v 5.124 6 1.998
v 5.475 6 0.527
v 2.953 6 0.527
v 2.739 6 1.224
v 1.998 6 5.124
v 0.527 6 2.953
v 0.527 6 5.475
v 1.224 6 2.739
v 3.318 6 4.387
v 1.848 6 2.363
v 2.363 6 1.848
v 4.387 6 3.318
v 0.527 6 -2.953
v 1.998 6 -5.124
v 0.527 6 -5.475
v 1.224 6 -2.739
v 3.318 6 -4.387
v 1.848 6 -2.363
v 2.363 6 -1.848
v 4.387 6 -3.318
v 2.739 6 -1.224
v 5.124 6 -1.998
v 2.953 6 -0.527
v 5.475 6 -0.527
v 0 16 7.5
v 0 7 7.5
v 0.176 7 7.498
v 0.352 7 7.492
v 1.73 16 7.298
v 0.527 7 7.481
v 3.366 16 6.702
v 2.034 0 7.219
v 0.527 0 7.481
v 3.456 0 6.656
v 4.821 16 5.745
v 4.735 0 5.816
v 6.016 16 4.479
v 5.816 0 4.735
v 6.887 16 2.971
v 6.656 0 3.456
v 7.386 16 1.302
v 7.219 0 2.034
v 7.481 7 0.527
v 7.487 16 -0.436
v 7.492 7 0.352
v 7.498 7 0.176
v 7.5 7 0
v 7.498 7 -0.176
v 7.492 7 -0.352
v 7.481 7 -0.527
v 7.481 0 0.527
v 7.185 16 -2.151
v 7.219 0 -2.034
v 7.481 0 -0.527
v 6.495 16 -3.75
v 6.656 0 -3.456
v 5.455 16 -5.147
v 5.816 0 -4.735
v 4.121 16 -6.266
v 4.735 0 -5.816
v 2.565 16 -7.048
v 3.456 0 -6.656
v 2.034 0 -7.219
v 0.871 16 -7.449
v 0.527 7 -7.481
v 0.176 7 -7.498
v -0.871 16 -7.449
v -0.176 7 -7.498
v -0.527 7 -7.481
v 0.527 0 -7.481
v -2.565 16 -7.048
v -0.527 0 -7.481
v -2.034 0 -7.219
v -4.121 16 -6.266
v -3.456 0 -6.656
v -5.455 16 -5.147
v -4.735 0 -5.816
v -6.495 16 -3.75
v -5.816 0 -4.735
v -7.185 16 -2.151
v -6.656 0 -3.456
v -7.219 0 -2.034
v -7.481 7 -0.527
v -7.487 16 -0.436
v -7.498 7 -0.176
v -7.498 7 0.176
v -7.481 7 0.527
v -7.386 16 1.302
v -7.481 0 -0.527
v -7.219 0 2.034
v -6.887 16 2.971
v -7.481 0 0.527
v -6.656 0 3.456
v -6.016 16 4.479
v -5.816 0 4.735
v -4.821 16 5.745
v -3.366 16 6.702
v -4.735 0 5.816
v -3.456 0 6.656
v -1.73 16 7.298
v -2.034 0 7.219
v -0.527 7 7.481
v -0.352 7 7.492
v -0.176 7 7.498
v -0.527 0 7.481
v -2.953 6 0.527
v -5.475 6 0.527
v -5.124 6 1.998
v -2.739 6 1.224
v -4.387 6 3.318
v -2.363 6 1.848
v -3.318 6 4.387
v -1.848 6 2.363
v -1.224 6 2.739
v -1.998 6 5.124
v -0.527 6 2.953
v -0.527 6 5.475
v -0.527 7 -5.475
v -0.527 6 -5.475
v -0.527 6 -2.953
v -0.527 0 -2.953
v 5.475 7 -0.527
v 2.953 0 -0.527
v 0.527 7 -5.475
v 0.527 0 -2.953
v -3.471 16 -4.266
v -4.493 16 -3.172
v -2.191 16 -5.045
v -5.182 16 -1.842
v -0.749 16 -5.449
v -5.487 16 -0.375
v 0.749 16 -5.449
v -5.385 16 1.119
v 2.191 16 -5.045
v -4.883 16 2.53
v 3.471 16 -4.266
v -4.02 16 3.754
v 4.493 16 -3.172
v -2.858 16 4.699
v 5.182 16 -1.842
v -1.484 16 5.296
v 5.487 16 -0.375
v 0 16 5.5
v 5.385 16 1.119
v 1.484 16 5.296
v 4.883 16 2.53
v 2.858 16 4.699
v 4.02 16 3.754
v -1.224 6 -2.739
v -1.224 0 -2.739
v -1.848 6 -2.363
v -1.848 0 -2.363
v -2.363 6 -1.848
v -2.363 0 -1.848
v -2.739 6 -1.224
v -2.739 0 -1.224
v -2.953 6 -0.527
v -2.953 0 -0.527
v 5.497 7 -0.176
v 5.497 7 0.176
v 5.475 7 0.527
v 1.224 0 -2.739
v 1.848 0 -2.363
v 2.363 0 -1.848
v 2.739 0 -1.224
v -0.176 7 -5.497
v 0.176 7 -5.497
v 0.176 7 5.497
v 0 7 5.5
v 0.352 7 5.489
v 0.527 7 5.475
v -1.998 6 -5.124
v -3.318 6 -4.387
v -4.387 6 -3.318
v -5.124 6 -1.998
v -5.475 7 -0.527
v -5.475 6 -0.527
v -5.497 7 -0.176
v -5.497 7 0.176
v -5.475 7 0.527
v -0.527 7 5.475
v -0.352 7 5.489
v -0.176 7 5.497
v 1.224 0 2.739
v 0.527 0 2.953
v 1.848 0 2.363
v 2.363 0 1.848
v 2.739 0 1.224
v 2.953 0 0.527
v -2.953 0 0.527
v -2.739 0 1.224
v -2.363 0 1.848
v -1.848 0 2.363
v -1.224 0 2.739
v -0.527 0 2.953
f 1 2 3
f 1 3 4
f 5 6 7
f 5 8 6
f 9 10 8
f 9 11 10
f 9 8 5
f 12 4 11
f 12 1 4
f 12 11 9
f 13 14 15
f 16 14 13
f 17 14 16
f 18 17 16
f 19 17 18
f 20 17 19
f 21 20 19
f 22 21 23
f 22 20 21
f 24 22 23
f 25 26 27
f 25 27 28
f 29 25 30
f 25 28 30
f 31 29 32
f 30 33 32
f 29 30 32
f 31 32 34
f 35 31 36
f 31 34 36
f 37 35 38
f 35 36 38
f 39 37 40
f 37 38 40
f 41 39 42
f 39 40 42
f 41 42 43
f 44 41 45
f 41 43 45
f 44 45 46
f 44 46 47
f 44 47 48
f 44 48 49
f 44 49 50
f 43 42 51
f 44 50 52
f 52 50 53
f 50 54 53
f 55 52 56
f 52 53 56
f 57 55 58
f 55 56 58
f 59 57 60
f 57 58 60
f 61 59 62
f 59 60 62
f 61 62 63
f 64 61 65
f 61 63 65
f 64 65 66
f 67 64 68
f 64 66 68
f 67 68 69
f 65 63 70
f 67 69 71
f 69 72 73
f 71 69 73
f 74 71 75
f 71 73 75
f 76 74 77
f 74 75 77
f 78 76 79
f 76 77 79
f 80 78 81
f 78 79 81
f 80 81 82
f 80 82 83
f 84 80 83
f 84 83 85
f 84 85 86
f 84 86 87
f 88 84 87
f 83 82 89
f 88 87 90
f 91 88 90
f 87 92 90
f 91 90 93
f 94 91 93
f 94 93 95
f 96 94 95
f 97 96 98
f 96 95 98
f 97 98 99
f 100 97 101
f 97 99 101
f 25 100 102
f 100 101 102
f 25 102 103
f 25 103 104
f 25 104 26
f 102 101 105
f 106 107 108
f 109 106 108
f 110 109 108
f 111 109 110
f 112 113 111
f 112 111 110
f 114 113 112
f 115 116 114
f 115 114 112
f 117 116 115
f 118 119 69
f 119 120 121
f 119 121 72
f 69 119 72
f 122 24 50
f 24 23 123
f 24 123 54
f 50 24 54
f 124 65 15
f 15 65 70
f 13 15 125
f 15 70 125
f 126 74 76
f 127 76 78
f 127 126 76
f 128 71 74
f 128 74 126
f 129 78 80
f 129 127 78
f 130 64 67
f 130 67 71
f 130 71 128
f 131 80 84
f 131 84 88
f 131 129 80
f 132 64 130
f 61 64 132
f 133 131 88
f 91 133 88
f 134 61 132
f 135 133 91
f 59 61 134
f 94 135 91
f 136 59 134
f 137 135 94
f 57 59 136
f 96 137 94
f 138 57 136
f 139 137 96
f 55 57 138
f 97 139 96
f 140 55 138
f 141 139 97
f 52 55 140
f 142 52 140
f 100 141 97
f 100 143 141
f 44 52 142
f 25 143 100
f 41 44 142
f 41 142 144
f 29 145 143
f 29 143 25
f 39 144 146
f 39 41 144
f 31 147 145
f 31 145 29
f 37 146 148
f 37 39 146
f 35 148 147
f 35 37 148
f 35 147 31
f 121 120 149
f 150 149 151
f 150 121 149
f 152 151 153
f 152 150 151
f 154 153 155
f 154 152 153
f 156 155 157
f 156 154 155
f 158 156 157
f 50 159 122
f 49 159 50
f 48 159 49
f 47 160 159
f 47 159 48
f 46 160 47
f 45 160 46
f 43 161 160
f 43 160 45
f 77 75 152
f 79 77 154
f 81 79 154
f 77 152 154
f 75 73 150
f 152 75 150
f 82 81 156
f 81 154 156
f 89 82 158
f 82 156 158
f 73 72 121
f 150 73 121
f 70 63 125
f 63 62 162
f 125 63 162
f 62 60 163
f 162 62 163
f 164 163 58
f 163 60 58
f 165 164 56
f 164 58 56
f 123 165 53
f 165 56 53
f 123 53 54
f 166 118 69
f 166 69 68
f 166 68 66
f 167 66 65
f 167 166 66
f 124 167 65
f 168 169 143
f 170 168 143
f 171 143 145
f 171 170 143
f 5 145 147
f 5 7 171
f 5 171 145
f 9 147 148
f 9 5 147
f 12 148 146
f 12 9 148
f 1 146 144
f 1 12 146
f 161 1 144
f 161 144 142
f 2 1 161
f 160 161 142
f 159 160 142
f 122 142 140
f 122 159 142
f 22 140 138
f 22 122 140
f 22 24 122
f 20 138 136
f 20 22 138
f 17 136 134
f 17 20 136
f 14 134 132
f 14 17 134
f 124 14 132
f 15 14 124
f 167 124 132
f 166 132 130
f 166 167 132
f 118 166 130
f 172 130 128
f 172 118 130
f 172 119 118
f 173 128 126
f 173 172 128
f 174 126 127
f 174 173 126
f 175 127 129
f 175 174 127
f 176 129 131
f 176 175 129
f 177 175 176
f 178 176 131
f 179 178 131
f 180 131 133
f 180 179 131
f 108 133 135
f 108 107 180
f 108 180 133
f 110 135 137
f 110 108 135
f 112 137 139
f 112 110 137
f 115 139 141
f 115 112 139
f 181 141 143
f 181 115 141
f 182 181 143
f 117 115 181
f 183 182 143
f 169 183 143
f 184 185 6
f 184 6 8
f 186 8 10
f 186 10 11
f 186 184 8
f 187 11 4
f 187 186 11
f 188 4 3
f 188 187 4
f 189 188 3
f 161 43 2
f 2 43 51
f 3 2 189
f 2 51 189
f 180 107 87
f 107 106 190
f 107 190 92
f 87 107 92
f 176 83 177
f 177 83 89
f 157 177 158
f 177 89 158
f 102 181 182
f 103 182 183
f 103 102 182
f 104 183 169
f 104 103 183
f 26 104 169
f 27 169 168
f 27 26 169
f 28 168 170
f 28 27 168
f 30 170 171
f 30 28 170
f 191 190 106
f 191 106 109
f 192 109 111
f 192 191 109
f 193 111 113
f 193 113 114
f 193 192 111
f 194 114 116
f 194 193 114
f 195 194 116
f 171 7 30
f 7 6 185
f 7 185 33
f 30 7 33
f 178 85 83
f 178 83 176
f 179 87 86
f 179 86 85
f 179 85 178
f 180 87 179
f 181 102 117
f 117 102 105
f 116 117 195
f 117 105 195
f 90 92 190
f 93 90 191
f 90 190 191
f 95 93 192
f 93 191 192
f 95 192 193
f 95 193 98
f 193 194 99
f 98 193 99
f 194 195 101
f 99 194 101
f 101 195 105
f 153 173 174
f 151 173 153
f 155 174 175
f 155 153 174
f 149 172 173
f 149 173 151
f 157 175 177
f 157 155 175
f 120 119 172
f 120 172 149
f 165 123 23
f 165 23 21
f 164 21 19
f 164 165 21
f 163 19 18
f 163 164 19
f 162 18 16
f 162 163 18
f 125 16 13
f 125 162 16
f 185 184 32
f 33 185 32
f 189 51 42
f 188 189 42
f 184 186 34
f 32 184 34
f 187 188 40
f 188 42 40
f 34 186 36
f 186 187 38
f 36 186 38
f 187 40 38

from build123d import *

# Parameters (mm, degrees)
SKETCH1_R           = 7.5
SKETCH1_R_2         = 3
BOSS_EXTRUDE1_DEPTH = 6
SKETCH2_R           = 7.5
SKETCH2_R_2         = 5.5
BOSS_EXTRUDE2_DEPTH = 10
CUT_EXTRUDE1_DEPTH  = 7


with BuildPart() as part:
    # Sketch1 → Boss-Extrude1 (new body)
    with BuildSketch(Plane(origin=(0, 0, 0), x_dir=(1, 0, 0), z_dir=(0, 1, 0))):
        with Locations(Location((0, 0, 0), (0, 0, 270))):
            Circle(SKETCH1_R)
        with Locations(Location((0, 0, 0), (0, 0, 270))):
            Circle(SKETCH1_R_2, mode=Mode.SUBTRACT)
    extrude(amount=BOSS_EXTRUDE1_DEPTH)

    # Sketch2 → Boss-Extrude2 (add)
    with BuildSketch(Plane(origin=(0, 6, 0), x_dir=(1, 0, 0), z_dir=(0, 1, 0))):
        with Locations(Location((0, 0, 0), (0, 0, 270))):
            Circle(SKETCH2_R)
        with Locations(Location((0, 0, 0), (0, 0, 270))):
            Circle(SKETCH2_R_2, mode=Mode.SUBTRACT)
    extrude(amount=BOSS_EXTRUDE2_DEPTH)

    # Sketch3 → Cut-Extrude1 (cut)
    with BuildSketch(Plane.XZ):
        with BuildLine():
            Line((-0.527362107, 10.532593193), (-0.527362107, 7.481436306))
            ThreePointArc((-0.527362107, 7.481436306), (0, 7.5), (0.527362107, 7.481436306))
            Line((0.527362107, 7.481436306), (0.527362107, 10.532593193))
            Line((0.527362107, 10.532593193), (-0.527362107, 10.532593193))
        make_face()
        with BuildLine():
            Line((-7.481436306, 0.527362107), (-10.459348456, 0.527362107))
            Line((-10.459348456, 0.527362107), (-10.459348456, -0.527362107))
            Line((-10.459348456, -0.527362107), (-7.481436306, -0.527362107))
            ThreePointArc((-7.481436306, -0.527362107), (-7.5, 0), (-7.481436306, 0.527362107))
        make_face()
        with BuildLine():
            ThreePointArc((0.527362107, 7.481436306), (0, 7.5), (-0.527362107, 7.481436306))
            Line((-0.527362107, 7.481436306), (-0.527362107, 2.953284478))
            ThreePointArc((-0.527362107, 2.953284478), (0, 3), (0.527362107, 2.953284478))
            Line((0.527362107, 2.953284478), (0.527362107, 7.481436306))
        make_face()
        with BuildLine():
            Line((-0.527362107, -2.953284478), (-0.527362107, -7.481436306))
            ThreePointArc((-0.527362107, -7.481436306), (0, -7.5), (0.527362107, -7.481436306))
            Line((0.527362107, -7.481436306), (0.527362107, -2.953284478))
            ThreePointArc((0.527362107, -2.953284478), (0, -3), (-0.527362107, -2.953284478))
        make_face()
        with BuildLine():
            Line((-2.953284478, 0.527362107), (-7.481436306, 0.527362107))
            ThreePointArc((-7.481436306, 0.527362107), (-7.5, 0), (-7.481436306, -0.527362107))
            Line((-7.481436306, -0.527362107), (-2.953284478, -0.527362107))
            ThreePointArc((-2.953284478, -0.527362107), (-3, 0), (-2.953284478, 0.527362107))
        make_face()
        with BuildLine():
            ThreePointArc((7.5, 0), (7.49535764, 0.263844368), (7.481436306, 0.527362107))
            Line((7.481436306, 0.527362107), (2.953284478, 0.527362107))
            ThreePointArc((2.953284478, 0.527362107), (2.988298298, 0.264713587), (3, 0))
            ThreePointArc((3, 0), (2.988298298, -0.264713587), (2.953284478, -0.527362107))
            Line((2.953284478, -0.527362107), (7.481436306, -0.527362107))
            ThreePointArc((7.481436306, -0.527362107), (7.49535764, -0.263844368), (7.5, 0))
        make_face()
    extrude(amount=-CUT_EXTRUDE1_DEPTH, mode=Mode.SUBTRACT)


solid = part.part
